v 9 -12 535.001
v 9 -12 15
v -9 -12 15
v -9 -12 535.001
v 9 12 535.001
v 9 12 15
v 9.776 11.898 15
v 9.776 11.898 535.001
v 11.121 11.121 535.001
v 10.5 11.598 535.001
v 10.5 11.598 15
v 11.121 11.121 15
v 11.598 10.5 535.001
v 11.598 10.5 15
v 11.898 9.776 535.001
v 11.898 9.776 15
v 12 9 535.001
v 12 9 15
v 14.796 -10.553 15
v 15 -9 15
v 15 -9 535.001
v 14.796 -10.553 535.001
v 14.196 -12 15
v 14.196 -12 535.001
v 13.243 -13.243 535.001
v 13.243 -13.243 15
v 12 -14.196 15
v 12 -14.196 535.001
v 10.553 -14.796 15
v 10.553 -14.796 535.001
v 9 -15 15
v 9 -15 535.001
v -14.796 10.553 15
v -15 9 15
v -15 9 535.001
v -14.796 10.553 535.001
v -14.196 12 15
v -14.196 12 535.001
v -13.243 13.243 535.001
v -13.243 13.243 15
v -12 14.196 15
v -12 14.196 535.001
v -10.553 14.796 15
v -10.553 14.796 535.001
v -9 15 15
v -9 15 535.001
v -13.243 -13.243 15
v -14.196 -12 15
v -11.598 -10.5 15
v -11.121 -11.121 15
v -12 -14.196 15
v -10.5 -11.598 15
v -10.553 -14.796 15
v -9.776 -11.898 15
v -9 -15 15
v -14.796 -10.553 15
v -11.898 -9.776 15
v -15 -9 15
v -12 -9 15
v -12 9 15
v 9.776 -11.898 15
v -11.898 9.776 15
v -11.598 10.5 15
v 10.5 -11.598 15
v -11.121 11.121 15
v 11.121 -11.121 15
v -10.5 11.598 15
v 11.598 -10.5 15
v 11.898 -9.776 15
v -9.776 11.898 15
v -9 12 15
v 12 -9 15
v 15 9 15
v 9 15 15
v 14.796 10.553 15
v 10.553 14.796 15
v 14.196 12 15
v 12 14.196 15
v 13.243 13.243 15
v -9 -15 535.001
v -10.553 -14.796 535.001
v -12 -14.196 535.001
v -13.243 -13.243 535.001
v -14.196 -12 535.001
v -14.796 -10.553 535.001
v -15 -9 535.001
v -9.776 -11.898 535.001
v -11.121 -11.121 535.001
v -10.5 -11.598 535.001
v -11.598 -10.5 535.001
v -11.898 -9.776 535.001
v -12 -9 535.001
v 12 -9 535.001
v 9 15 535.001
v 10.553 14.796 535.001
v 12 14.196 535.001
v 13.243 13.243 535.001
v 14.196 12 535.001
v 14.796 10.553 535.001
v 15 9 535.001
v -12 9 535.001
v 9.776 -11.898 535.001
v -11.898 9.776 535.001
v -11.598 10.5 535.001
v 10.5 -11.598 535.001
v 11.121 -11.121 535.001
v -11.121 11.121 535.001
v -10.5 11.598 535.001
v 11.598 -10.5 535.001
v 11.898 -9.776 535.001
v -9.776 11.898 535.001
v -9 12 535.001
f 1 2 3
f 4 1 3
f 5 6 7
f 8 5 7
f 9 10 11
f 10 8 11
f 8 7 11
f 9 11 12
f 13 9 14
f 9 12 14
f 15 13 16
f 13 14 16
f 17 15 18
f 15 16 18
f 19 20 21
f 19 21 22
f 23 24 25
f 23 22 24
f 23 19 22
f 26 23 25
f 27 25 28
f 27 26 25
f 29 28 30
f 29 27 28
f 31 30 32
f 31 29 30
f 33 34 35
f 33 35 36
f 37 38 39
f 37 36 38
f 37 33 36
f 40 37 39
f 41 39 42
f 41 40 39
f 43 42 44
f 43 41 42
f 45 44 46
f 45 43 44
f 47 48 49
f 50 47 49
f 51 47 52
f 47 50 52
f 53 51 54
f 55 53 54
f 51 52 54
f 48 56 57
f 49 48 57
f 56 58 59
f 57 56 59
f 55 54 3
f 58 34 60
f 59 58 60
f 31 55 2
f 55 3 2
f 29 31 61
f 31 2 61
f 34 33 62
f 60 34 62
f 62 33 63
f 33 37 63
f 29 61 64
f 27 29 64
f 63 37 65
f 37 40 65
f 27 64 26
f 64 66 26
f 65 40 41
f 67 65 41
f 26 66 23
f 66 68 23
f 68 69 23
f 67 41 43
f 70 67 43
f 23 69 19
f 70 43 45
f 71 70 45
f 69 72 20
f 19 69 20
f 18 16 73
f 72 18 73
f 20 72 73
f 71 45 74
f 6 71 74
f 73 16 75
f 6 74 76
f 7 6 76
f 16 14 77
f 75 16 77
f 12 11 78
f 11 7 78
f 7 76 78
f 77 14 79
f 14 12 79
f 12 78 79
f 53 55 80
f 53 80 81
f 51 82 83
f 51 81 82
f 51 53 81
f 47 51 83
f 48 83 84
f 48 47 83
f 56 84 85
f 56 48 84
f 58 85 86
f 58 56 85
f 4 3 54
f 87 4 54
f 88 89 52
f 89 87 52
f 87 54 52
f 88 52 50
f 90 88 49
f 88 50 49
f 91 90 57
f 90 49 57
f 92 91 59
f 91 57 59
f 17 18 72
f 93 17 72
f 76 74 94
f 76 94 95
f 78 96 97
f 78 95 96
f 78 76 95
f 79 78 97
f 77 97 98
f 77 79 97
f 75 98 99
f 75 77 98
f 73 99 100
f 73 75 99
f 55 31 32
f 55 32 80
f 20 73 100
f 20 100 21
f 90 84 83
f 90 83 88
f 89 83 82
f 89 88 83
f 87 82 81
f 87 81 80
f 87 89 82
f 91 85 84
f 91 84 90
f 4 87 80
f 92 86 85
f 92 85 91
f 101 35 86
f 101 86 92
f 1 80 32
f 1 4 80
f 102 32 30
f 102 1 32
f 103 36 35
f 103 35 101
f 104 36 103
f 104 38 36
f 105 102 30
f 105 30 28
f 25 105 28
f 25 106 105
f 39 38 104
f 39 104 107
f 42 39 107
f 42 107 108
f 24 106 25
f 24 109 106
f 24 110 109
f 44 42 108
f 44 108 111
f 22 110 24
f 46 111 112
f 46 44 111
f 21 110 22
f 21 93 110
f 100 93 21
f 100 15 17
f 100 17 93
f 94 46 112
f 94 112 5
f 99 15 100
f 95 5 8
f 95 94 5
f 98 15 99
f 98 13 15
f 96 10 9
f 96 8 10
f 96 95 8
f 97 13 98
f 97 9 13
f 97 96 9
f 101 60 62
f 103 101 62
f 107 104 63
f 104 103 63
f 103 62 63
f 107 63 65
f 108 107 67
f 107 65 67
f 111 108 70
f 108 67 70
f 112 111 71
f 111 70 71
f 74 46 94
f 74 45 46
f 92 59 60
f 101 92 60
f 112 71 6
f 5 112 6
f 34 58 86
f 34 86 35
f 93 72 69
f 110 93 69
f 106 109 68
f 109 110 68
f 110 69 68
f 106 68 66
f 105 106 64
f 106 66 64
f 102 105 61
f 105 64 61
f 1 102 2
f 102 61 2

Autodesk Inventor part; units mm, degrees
ref_plane "Start Plane" through (0, 0, 15) normal (0, 0, 1) x (1, 0, 0)
ref_plane "End Plane" through (0, 0, 535.0007) normal (0, 0, 1) x (1, 0, 0)
sketch "Sketch" plane through (0, 0, 0) normal (0, 0, 1) x (1, 0, 0)
  line L0 (-15, -9) -> (-15, 9)
  line L1 (-9, 15) -> (9, 15)
  line L2 (15, 9) -> (15, -9)
  line L3 (9, -15) -> (-9, -15)
  arc A0 (-15, -9) -> (-9, -15) centre (-9, -9) ccw
  arc A1 (-9, 15) -> (-15, 9) centre (-9, 9) ccw
  arc A2 (15, 9) -> (9, 15) centre (9, 9) ccw
  arc A3 (9, -15) -> (15, -9) centre (9, -9) ccw
  arc A4 (-9, 12) -> (-12, 9) centre (-9, 9) ccw
  line L4 (-9, 12) -> (9, 12)
  arc A5 (12, 9) -> (9, 12) centre (9, 9) ccw
  line L5 (12, 9) -> (12, -9)
  arc A6 (9, -12) -> (12, -9) centre (9, -9) ccw
  line L6 (9, -12) -> (-9, -12)
  arc A7 (-12, -9) -> (-9, -12) centre (-9, -9) ccw
  line L7 (-12, -9) -> (-12, 9)
  line L8 (0, 22.7397) -> (0, -22.7397) construction
  line L9 (-22.7397, 0) -> (22.7397, 0) construction
  dimension "d7" = 6
  dimension "d10" = 30
  dimension "d11" = 30
  dimension "d12" = 3
  dimension "d15" = 15
  dimension "d16" = 15
extrude "Body" add sketch "Sketch" along normal up to surface (520.0007 mm away) from surface at 15
sketch "Sketch3" plane through (0, 0, 0) normal (0, 0, 1) x (1, 0, 0)
  line L0 (0, 0) -> (10, 0)
ref_plane "Work Plane3" through (0, 0, 0) normal (0, -1, 0) x (1, 0, 0)
ref_plane "Work Plane4" through (9, 1515, 15) normal (0, 0, -1) x (-1, 0, 0)
split "Split1" plane through (9, 1515, 15) removes the side toward (0, 0, -1)
ref_plane "Work Plane6" through (9.0011, 375, 535.0007) normal (0, 0, 1) x (1, 0, 0)
split "Split3" plane through (9.0011, 375, 535.0007) removes the side toward (0, 0, 1)
sketch "Sketch4" plane through (0, 0, 0) normal (0, -1, 0) x (1, 0, 0)
  line L0 (-2, 15) -> (12, 15) projected
  line L1 (-2, 535.0007) -> (12, 535.0007) projected
  dimension "d18" = 520.0007
equation "\"d7\" = G_IR"
equation "\"d10\" = G_H"
equation "\"d11\" = G_W"
equation "\"d12\" = G_T"
equation "\"d15\" = 0.5 * d10"
equation "\"d16\" = 0.5 * d11"
equation "\"d3\" = G_L"
equation "\"G_W\" = 30"
equation "\"G_H\" = 30"
equation "\"G_T\" = 3"
equation "\"G_IR\" = 6"
equation "\"G_L\" = d18"
equation "\"G_OFFSET_START\" = -15"
equation "\"G_OFFSET_END\" = -14.99934"
equation "\"d13\" = -G_OFFSET_START"
equation "\"d14\" = G_OFFSET_END + B_L"
equation "\"B_L\" = 550"
properties part number "DIN EN 10219-2 - 30 x 30 x 3  - 520" material "Steel, Mild"
